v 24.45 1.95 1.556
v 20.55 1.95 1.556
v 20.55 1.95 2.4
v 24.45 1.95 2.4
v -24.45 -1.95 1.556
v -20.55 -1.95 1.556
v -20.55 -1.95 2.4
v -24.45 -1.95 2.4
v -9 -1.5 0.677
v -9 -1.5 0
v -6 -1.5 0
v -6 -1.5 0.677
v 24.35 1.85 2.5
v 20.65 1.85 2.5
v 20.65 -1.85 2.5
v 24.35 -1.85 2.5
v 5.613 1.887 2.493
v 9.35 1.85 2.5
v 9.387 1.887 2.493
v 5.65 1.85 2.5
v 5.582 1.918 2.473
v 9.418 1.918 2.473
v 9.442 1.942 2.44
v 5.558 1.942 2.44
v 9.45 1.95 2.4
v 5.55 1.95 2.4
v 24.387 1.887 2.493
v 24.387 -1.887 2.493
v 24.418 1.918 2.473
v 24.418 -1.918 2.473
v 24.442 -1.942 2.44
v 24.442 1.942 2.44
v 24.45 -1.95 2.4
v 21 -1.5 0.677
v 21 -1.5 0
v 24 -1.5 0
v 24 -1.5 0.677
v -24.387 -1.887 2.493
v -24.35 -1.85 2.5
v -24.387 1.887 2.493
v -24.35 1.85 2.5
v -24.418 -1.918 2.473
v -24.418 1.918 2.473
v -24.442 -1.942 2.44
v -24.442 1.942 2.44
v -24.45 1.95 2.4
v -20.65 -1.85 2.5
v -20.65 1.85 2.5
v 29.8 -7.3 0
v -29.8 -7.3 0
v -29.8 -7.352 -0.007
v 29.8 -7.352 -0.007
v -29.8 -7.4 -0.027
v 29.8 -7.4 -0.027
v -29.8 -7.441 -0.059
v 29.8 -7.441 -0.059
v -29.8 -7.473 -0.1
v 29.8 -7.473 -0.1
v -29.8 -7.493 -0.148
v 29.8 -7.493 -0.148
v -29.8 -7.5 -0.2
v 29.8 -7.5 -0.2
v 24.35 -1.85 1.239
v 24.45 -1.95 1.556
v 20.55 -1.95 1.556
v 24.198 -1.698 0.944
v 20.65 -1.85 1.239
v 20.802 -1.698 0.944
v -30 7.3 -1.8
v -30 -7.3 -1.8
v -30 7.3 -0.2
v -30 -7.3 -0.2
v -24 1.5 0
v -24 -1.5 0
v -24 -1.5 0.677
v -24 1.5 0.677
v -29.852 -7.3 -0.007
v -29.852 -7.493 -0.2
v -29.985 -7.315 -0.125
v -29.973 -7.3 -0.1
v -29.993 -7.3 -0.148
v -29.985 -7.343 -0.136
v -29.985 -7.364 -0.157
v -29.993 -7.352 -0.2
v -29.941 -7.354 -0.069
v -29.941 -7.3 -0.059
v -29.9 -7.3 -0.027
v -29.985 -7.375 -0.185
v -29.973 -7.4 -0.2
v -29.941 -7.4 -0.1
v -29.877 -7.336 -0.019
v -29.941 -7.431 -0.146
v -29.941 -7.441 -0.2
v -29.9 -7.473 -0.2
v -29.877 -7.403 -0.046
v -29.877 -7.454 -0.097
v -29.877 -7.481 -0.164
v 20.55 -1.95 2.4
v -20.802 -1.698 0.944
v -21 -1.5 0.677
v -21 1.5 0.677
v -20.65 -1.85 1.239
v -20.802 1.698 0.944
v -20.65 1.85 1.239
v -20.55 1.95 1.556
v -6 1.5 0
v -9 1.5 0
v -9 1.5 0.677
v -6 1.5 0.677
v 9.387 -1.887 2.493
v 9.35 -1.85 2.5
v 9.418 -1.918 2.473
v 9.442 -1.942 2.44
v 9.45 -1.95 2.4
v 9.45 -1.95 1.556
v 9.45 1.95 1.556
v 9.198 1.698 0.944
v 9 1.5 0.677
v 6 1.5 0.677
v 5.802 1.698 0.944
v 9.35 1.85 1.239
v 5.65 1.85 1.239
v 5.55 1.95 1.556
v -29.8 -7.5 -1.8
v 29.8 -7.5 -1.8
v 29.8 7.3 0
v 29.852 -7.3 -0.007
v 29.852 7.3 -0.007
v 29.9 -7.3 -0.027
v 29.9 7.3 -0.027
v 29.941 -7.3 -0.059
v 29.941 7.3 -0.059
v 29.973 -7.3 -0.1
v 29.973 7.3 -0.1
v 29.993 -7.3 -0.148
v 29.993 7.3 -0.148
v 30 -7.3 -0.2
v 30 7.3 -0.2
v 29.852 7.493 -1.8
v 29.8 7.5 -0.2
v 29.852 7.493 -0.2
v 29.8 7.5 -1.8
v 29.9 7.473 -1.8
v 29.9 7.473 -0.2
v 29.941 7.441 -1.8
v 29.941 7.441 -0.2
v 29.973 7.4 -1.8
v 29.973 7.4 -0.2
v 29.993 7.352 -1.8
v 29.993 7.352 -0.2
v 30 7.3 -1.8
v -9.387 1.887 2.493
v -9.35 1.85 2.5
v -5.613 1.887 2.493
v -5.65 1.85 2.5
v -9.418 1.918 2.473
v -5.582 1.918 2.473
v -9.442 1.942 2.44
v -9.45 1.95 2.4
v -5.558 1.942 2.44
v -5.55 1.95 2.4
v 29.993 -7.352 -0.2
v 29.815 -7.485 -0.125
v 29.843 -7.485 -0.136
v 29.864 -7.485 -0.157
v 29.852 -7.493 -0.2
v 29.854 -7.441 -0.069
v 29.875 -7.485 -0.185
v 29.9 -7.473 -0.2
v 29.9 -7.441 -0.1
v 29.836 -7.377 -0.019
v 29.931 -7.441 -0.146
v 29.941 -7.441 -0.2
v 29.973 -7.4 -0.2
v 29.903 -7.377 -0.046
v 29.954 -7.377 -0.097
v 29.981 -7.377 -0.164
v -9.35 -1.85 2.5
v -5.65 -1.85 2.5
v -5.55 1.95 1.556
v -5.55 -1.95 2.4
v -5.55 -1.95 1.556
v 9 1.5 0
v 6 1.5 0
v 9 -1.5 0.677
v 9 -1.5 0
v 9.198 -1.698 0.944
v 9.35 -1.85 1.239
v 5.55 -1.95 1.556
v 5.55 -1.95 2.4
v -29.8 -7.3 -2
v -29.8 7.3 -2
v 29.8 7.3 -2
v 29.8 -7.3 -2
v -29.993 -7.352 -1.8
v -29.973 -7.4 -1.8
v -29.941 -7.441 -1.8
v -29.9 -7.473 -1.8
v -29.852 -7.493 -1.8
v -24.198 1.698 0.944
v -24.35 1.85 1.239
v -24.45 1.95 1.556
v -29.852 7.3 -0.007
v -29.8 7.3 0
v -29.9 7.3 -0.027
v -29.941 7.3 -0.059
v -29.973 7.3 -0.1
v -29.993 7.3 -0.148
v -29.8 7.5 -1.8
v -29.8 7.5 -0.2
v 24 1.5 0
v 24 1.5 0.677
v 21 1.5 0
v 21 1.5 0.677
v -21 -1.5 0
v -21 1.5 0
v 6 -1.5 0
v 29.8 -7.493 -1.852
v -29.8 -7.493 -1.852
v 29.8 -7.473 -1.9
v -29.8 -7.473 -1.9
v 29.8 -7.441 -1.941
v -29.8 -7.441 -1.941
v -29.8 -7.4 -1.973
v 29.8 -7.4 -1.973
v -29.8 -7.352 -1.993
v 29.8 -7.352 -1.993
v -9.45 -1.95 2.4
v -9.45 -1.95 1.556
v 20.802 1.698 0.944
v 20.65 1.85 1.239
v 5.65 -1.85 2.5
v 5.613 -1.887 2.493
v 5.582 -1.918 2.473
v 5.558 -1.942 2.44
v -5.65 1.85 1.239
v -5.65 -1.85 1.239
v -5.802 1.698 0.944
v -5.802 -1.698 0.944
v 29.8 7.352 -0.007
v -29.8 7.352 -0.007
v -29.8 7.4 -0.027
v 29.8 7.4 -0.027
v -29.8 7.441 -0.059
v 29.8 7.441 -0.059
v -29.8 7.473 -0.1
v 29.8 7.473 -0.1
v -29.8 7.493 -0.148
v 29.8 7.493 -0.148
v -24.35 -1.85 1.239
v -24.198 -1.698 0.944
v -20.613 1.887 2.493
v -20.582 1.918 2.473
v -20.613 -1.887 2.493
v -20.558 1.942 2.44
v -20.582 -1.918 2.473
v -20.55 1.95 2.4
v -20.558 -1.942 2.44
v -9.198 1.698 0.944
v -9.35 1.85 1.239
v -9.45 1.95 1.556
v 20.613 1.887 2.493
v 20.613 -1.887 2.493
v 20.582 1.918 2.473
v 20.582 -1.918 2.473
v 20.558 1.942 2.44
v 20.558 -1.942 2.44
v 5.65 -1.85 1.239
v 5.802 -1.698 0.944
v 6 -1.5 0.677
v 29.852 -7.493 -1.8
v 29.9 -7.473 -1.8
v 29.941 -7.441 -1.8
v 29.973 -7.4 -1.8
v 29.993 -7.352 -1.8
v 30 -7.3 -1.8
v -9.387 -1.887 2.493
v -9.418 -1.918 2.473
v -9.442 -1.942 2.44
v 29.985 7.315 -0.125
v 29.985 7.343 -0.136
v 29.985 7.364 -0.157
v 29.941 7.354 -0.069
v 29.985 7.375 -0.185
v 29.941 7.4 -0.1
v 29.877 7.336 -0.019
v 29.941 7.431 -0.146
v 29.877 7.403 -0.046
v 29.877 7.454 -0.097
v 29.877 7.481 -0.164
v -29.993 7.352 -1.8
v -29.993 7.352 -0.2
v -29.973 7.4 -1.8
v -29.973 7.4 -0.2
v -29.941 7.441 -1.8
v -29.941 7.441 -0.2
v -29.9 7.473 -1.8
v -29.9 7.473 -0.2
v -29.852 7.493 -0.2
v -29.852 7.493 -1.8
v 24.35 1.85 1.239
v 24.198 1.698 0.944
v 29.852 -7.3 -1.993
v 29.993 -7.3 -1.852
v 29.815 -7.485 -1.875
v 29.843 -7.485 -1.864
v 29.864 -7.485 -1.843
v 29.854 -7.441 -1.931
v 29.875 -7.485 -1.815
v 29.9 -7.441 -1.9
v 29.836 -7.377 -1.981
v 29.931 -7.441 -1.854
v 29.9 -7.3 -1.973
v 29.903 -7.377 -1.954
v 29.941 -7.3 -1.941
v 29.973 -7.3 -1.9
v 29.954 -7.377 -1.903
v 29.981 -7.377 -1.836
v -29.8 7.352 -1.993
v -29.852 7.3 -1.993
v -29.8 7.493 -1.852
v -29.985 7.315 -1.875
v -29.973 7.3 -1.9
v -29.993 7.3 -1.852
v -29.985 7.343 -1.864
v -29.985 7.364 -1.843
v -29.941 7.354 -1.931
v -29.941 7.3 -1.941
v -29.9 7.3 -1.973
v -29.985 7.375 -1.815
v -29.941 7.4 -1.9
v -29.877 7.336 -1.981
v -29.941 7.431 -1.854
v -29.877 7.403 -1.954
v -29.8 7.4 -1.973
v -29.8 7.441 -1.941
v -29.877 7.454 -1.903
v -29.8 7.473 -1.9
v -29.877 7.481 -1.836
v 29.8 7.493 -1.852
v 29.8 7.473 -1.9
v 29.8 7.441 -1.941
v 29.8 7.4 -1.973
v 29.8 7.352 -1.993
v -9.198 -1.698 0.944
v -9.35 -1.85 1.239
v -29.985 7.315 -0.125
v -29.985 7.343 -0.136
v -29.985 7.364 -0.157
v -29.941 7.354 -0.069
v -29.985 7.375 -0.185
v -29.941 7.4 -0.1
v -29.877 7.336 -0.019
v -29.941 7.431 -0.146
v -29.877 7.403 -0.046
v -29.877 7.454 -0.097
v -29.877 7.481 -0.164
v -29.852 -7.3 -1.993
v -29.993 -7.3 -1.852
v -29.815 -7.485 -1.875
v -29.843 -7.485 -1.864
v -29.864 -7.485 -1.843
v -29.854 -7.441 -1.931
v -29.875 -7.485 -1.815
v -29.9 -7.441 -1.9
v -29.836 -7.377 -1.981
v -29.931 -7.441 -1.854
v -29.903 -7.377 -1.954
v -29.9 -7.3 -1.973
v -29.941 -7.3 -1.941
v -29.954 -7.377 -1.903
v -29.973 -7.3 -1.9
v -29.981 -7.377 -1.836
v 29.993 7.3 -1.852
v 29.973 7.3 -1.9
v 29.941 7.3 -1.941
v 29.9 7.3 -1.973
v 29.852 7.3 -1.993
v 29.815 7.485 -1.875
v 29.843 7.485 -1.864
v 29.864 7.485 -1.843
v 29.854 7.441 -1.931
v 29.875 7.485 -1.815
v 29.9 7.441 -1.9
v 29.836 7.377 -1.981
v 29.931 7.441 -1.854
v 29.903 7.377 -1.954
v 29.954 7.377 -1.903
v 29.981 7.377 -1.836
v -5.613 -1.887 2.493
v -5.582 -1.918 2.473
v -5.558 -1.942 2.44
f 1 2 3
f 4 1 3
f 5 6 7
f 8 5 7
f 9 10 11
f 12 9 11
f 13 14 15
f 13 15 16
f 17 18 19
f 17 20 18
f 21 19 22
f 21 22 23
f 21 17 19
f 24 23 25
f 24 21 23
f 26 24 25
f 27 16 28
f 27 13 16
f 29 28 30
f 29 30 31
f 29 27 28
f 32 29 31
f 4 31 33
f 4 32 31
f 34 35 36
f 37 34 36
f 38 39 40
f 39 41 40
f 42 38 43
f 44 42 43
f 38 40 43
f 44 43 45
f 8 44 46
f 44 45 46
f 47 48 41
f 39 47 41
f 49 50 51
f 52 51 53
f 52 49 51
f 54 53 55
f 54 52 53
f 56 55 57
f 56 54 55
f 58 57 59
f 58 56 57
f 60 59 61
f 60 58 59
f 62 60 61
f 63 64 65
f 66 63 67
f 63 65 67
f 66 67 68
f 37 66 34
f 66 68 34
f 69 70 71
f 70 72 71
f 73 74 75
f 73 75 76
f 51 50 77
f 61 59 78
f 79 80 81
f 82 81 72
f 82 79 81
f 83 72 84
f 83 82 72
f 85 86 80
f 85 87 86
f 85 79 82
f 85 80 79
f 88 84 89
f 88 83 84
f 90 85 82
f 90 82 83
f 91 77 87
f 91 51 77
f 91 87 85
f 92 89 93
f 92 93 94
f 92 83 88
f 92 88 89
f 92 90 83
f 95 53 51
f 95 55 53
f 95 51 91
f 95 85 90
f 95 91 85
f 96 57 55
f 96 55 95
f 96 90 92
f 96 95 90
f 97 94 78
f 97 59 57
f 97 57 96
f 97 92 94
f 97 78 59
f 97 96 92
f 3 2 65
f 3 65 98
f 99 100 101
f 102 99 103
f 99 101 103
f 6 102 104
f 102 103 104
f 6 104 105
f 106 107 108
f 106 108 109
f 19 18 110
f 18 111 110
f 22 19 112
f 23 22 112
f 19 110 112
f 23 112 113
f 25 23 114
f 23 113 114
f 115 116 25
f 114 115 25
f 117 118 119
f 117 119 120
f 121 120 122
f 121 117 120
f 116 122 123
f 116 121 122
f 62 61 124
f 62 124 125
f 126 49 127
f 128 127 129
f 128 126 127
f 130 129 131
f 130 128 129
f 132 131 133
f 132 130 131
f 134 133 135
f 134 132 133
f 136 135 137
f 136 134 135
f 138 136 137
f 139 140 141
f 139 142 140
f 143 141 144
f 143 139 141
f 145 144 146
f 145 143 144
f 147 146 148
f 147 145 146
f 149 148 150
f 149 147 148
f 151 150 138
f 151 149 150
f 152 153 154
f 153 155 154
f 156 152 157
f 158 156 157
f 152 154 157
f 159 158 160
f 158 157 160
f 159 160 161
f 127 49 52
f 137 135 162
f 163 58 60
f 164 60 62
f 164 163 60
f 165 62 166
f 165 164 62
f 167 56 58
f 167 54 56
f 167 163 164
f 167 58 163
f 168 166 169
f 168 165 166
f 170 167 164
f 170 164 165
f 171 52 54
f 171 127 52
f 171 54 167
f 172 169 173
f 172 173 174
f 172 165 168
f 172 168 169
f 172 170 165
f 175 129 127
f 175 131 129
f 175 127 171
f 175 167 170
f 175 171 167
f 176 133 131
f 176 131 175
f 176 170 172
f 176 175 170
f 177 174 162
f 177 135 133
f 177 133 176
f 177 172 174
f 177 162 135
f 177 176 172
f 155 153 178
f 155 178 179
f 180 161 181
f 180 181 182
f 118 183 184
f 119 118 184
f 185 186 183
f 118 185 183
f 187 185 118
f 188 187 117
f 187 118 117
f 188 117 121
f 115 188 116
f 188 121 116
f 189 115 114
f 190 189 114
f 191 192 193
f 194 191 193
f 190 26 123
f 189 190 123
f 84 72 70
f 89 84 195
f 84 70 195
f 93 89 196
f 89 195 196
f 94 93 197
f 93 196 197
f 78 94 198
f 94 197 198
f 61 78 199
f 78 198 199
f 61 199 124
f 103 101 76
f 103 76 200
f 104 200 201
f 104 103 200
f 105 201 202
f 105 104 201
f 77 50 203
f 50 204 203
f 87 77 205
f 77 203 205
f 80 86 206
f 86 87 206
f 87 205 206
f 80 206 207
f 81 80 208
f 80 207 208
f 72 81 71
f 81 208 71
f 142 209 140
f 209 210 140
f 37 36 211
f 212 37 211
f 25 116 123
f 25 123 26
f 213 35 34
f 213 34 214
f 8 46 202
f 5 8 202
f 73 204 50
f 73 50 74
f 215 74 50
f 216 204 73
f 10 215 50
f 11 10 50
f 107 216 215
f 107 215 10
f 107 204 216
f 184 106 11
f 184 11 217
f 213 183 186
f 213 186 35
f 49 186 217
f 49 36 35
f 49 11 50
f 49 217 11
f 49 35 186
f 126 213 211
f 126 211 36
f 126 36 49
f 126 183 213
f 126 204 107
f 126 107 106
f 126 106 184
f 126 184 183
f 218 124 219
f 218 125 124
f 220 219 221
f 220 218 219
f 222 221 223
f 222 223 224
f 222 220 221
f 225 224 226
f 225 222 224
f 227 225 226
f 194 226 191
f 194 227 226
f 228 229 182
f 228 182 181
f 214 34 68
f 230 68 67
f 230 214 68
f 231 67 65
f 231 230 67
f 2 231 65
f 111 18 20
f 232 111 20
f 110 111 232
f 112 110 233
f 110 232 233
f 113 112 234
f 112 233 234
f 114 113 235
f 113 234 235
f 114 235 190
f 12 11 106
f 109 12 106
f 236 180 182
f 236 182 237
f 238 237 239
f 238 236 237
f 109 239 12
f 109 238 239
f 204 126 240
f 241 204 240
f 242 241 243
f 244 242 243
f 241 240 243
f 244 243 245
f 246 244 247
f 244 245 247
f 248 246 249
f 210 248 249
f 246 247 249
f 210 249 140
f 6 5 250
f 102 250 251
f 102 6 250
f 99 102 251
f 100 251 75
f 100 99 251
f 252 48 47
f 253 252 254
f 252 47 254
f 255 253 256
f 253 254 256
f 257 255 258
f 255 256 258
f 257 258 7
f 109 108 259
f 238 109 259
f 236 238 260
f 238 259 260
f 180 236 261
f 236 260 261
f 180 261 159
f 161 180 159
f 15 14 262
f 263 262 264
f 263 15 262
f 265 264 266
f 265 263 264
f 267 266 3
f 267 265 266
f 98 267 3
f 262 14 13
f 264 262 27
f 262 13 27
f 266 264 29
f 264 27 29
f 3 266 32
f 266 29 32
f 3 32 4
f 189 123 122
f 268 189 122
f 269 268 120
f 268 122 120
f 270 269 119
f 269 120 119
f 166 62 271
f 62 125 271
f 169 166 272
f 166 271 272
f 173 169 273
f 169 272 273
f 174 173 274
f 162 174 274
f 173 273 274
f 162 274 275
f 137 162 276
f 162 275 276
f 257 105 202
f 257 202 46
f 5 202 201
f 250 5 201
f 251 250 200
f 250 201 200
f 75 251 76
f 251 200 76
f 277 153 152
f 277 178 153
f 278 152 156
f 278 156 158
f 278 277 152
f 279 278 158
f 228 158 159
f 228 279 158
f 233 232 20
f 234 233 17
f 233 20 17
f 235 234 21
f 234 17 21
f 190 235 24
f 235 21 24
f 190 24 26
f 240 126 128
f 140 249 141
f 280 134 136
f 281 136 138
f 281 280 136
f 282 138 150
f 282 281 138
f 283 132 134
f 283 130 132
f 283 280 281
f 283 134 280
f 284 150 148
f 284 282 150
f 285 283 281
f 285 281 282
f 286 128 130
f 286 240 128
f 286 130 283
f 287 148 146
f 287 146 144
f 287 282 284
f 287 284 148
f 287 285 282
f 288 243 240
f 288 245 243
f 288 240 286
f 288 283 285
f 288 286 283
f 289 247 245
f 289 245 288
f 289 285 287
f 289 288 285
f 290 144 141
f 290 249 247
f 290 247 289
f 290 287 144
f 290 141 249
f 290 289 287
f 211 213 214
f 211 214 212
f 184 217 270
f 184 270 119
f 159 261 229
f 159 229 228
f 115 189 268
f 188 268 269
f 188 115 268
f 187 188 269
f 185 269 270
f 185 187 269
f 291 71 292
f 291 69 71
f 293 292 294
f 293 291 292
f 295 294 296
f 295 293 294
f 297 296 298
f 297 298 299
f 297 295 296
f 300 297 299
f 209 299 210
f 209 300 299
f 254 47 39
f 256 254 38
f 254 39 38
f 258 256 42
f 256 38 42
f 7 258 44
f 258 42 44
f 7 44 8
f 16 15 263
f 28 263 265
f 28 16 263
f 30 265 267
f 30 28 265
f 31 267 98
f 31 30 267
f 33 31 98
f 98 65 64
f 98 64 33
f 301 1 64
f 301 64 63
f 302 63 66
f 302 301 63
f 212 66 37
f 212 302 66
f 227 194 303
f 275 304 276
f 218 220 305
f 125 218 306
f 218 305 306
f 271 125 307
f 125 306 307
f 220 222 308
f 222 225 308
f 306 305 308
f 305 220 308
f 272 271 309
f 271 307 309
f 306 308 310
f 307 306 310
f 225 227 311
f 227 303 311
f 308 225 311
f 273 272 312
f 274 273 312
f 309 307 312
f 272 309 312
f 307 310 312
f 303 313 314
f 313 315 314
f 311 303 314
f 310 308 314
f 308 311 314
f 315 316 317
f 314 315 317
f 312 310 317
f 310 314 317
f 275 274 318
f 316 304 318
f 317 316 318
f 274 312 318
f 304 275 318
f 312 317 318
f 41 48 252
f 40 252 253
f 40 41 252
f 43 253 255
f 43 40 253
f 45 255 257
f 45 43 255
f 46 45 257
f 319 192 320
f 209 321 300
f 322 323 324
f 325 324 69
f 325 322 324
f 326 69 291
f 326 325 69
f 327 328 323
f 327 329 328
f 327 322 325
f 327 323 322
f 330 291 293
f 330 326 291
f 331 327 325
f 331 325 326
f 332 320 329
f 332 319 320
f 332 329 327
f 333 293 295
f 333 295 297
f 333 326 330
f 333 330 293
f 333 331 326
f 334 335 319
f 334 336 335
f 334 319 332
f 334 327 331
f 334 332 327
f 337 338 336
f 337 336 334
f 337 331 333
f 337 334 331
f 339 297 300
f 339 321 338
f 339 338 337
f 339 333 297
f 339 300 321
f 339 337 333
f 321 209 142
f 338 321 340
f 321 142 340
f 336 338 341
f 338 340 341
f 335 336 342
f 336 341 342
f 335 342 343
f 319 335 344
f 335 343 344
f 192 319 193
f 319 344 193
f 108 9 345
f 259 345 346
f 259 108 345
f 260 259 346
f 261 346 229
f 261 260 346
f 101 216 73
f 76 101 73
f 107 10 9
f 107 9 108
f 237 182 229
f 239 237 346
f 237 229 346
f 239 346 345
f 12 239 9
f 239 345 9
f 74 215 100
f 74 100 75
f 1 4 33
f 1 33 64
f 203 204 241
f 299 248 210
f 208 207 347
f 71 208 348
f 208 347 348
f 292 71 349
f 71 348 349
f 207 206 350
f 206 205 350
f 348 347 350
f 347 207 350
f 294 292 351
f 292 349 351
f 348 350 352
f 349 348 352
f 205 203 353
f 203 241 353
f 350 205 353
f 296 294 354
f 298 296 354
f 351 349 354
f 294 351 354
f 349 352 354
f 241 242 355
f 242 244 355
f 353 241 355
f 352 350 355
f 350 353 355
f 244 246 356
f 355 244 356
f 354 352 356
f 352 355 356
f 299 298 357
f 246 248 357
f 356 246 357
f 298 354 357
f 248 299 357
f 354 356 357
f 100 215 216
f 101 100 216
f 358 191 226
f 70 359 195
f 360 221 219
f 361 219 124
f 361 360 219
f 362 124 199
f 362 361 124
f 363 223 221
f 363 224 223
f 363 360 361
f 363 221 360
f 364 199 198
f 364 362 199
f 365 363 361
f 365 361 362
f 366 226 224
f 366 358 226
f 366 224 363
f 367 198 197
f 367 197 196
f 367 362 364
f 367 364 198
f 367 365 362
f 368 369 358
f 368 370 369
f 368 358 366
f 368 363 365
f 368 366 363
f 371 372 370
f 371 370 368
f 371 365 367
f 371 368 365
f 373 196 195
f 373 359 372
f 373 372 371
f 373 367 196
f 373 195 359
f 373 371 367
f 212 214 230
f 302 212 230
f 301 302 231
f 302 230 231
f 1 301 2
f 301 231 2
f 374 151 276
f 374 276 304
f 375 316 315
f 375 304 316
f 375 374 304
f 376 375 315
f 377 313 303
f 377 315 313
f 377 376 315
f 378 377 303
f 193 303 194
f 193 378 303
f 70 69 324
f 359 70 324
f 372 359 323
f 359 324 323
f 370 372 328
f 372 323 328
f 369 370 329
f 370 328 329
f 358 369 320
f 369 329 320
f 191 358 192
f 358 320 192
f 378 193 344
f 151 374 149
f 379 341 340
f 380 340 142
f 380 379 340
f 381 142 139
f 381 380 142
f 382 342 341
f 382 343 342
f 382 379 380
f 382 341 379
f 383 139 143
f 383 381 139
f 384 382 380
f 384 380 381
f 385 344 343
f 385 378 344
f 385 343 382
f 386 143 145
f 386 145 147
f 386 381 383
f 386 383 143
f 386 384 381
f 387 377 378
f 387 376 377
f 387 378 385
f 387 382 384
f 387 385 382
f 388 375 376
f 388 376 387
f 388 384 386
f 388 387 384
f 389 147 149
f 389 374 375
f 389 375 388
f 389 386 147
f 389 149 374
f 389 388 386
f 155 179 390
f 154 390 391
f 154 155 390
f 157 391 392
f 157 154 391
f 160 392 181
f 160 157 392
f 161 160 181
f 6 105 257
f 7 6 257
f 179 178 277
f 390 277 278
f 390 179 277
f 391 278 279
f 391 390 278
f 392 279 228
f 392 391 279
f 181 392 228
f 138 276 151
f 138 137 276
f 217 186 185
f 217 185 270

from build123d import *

# Parameters (mm, degrees)
SKETCH_1_W             = 60
SKETCH_1_H             = 15
EXTRUDE_1_DEPTH        = 2
SKETCH_2_W             = 3
SKETCH_2_H             = 3
EXTRUDE_2_DEPTH        = 1
EXTRUDE_3_DEPTH        = 2
CUT_EXTRUDE_1_REACH    = 42.234
SKETCH_4_W             = 0.944409721
SKETCH_4_H             = 0.05
FILLET_1_R             = 0.1
FILLET_1_OF_MIRROR_2_R = 0.1
FILLET_2_R             = 0.2


# Read off the part's stored shape, not the designer's step: 镜向3
with BuildPart() as part:
    # 草图1 → 凸台-拉伸1 (new body)
    with BuildSketch(Plane.XY):
        Rectangle(SKETCH_1_W, SKETCH_1_H)
    extrude(amount=-EXTRUDE_1_DEPTH)

    # 草图2 → 凸台-拉伸2 (add)
    with BuildSketch(Plane.XY):
        with Locations((-7.5, 0)):
            Rectangle(SKETCH_2_W, SKETCH_2_H)
    extrude_2 = extrude(amount=EXTRUDE_2_DEPTH)

    # 草图3 → 凸台-拉伸3 (add, symmetric)
    with BuildSketch(Plane(origin=(0, 0, 0), x_dir=(1, 0, 0), z_dir=(0, 1, 0))):
        with BuildLine():
            Line((-9.45, -2.5), (-5.55, -2.5))
            Line((-5.55, -2.5), (-5.55, -1.555590279))
            ThreePointArc((-5.55, -1.555590279), (-5.719957697, -1.088161527), (-6, -0.677124344))
            Line((-6, -0.677124344), (-9, -0.677124344))
            ThreePointArc((-9, -0.677124344), (-9.280042303, -1.088161527), (-9.45, -1.555590279))
            Line((-9.45, -1.555590279), (-9.45, -2.5))
        make_face()
    extrude_3 = extrude(amount=EXTRUDE_3_DEPTH, both=True)

    # 草图4 → 切除-拉伸1 (cut, up to next)
    with BuildSketch(Plane.ZY.offset(9.45), mode=Mode.PRIVATE) as cut_extrude_1_sk1:
        with BuildLine():
            Line((1.555590279, 1.95), (1.555590279, 2))
            Line((1.555590279, 2), (0.677124344, 2))
            Line((0.677124344, 2), (0.677124344, 1.5))
            ThreePointArc((0.677124344, 1.5), (1.088161527, 1.780042303), (1.555590279, 1.95))
        make_face()
    cut_extrude_1_tool1 = extrude(cut_extrude_1_sk1.sketch, amount=-CUT_EXTRUDE_1_REACH, mode=Mode.PRIVATE) & part.part
    # 草图4 → 切除-拉伸1 (cut, up to next)
    with BuildSketch(Plane.ZY.offset(9.45), mode=Mode.PRIVATE) as cut_extrude_1_sk2:
        with Locations((2.02779514, 1.975)):
            Rectangle(SKETCH_4_W, SKETCH_4_H)
    cut_extrude_1_tool2 = extrude(cut_extrude_1_sk2.sketch, amount=-CUT_EXTRUDE_1_REACH, mode=Mode.PRIVATE) & part.part
    # 草图4 → 切除-拉伸1 (cut, up to next)
    with BuildSketch(Plane.ZY.offset(9.45), mode=Mode.PRIVATE) as cut_extrude_1_sk3:
        with Locations((2.02779514, -1.975)):
            Rectangle(SKETCH_4_W, SKETCH_4_H)
    cut_extrude_1_tool3 = extrude(cut_extrude_1_sk3.sketch, amount=-CUT_EXTRUDE_1_REACH, mode=Mode.PRIVATE) & part.part
    # 草图4 → 切除-拉伸1 (cut, up to next)
    with BuildSketch(Plane.ZY.offset(9.45), mode=Mode.PRIVATE) as cut_extrude_1_sk4:
        with BuildLine():
            Line((1.555590279, -2), (1.555590279, -1.95))
            ThreePointArc((1.555590279, -1.95), (1.088161527, -1.780042303), (0.677124344, -1.5))
            Line((0.677124344, -1.5), (0.677124344, -2))
            Line((0.677124344, -2), (1.555590279, -2))
        make_face()
    cut_extrude_1_tool4 = extrude(cut_extrude_1_sk4.sketch, amount=-CUT_EXTRUDE_1_REACH, mode=Mode.PRIVATE) & part.part
    cut_extrude_1_1 = cut_extrude_1_tool1.solids().sort_by_distance((-9.45, 1.849056, 0.974505))[0]
    add(cut_extrude_1_1, mode=Mode.SUBTRACT)
    cut_extrude_1_2 = cut_extrude_1_tool2.solids().sort_by_distance((-9.45, 1.975, 2.027795))[0]
    add(cut_extrude_1_2, mode=Mode.SUBTRACT)
    cut_extrude_1_3 = cut_extrude_1_tool3.solids().sort_by_distance((-9.45, -1.975, 2.027795))[0]
    add(cut_extrude_1_3, mode=Mode.SUBTRACT)
    cut_extrude_1_4 = cut_extrude_1_tool4.solids().sort_by_distance((-9.45, -1.849056, 0.974505))[0]
    add(cut_extrude_1_4, mode=Mode.SUBTRACT)
    cut_extrude_1 = cut_extrude_1_1 + cut_extrude_1_2 + cut_extrude_1_3 + cut_extrude_1_4  # 切除-拉伸1 as one shape, for the pattern or mirror that repeats it

    # 圆角1
    fillet_1_edges = [part.edges().sort_by_distance(p)[0] for p in [
        (-7.5, 1.95, 2.5),
        (-9.45, 0, 2.5),
        (-5.55, 0, 2.5),
        (-7.5, -1.95, 2.5),
    ]]
    fillet(fillet_1_edges, radius=FILLET_1_R)

    # 镜向2: 凸台-拉伸2, 凸台-拉伸3, 切除-拉伸1 across plane
    add(extrude_2.mirror(Plane(origin=(-15, 0, 0), x_dir=(0, 0, 1), z_dir=(1, 0, 0))))
    add(extrude_3.mirror(Plane(origin=(-15, 0, 0), x_dir=(0, 0, 1), z_dir=(1, 0, 0))))
    add(cut_extrude_1.mirror(Plane(origin=(-15, 0, 0), x_dir=(0, 0, 1), z_dir=(1, 0, 0))), mode=Mode.SUBTRACT)

    # 圆角1 of 镜向2
    fillet_1_of_mirror_2_edges = [part.edges().sort_by_distance(p)[0] for p in [
        (-22.5, 1.95, 2.5),
        (-20.55, 0, 2.5),
        (-24.45, 0, 2.5),
        (-22.5, -1.95, 2.5),
    ]]
    fillet(fillet_1_of_mirror_2_edges, radius=FILLET_1_OF_MIRROR_2_R)

    # 镜向3: part across plane


with BuildPart() as part_1:
    add(part.part)
    add(part.part.mirror(Plane(origin=(0, 0, 0), x_dir=(0, 0, 1), z_dir=(1, 0, 0))))

    # 圆角2
    fillet_2_edges = [part_1.edges().sort_by_distance(p)[0] for p in [
        (30, 0, -2),
        (0, 7.5, -2),
        (-30, 0, -2),
        (0, 7.5, 0),
        (30, 0, 0),
        (0, -7.5, 0),
        (-30, 0, 0),
        (0, -7.5, -2),
        (-30, 7.5, -1),
        (30, 7.5, -1),
        (30, -7.5, -1),
        (-30, -7.5, -1),
    ]]
    fillet(fillet_2_edges, radius=FILLET_2_R)


solid = part_1.part
